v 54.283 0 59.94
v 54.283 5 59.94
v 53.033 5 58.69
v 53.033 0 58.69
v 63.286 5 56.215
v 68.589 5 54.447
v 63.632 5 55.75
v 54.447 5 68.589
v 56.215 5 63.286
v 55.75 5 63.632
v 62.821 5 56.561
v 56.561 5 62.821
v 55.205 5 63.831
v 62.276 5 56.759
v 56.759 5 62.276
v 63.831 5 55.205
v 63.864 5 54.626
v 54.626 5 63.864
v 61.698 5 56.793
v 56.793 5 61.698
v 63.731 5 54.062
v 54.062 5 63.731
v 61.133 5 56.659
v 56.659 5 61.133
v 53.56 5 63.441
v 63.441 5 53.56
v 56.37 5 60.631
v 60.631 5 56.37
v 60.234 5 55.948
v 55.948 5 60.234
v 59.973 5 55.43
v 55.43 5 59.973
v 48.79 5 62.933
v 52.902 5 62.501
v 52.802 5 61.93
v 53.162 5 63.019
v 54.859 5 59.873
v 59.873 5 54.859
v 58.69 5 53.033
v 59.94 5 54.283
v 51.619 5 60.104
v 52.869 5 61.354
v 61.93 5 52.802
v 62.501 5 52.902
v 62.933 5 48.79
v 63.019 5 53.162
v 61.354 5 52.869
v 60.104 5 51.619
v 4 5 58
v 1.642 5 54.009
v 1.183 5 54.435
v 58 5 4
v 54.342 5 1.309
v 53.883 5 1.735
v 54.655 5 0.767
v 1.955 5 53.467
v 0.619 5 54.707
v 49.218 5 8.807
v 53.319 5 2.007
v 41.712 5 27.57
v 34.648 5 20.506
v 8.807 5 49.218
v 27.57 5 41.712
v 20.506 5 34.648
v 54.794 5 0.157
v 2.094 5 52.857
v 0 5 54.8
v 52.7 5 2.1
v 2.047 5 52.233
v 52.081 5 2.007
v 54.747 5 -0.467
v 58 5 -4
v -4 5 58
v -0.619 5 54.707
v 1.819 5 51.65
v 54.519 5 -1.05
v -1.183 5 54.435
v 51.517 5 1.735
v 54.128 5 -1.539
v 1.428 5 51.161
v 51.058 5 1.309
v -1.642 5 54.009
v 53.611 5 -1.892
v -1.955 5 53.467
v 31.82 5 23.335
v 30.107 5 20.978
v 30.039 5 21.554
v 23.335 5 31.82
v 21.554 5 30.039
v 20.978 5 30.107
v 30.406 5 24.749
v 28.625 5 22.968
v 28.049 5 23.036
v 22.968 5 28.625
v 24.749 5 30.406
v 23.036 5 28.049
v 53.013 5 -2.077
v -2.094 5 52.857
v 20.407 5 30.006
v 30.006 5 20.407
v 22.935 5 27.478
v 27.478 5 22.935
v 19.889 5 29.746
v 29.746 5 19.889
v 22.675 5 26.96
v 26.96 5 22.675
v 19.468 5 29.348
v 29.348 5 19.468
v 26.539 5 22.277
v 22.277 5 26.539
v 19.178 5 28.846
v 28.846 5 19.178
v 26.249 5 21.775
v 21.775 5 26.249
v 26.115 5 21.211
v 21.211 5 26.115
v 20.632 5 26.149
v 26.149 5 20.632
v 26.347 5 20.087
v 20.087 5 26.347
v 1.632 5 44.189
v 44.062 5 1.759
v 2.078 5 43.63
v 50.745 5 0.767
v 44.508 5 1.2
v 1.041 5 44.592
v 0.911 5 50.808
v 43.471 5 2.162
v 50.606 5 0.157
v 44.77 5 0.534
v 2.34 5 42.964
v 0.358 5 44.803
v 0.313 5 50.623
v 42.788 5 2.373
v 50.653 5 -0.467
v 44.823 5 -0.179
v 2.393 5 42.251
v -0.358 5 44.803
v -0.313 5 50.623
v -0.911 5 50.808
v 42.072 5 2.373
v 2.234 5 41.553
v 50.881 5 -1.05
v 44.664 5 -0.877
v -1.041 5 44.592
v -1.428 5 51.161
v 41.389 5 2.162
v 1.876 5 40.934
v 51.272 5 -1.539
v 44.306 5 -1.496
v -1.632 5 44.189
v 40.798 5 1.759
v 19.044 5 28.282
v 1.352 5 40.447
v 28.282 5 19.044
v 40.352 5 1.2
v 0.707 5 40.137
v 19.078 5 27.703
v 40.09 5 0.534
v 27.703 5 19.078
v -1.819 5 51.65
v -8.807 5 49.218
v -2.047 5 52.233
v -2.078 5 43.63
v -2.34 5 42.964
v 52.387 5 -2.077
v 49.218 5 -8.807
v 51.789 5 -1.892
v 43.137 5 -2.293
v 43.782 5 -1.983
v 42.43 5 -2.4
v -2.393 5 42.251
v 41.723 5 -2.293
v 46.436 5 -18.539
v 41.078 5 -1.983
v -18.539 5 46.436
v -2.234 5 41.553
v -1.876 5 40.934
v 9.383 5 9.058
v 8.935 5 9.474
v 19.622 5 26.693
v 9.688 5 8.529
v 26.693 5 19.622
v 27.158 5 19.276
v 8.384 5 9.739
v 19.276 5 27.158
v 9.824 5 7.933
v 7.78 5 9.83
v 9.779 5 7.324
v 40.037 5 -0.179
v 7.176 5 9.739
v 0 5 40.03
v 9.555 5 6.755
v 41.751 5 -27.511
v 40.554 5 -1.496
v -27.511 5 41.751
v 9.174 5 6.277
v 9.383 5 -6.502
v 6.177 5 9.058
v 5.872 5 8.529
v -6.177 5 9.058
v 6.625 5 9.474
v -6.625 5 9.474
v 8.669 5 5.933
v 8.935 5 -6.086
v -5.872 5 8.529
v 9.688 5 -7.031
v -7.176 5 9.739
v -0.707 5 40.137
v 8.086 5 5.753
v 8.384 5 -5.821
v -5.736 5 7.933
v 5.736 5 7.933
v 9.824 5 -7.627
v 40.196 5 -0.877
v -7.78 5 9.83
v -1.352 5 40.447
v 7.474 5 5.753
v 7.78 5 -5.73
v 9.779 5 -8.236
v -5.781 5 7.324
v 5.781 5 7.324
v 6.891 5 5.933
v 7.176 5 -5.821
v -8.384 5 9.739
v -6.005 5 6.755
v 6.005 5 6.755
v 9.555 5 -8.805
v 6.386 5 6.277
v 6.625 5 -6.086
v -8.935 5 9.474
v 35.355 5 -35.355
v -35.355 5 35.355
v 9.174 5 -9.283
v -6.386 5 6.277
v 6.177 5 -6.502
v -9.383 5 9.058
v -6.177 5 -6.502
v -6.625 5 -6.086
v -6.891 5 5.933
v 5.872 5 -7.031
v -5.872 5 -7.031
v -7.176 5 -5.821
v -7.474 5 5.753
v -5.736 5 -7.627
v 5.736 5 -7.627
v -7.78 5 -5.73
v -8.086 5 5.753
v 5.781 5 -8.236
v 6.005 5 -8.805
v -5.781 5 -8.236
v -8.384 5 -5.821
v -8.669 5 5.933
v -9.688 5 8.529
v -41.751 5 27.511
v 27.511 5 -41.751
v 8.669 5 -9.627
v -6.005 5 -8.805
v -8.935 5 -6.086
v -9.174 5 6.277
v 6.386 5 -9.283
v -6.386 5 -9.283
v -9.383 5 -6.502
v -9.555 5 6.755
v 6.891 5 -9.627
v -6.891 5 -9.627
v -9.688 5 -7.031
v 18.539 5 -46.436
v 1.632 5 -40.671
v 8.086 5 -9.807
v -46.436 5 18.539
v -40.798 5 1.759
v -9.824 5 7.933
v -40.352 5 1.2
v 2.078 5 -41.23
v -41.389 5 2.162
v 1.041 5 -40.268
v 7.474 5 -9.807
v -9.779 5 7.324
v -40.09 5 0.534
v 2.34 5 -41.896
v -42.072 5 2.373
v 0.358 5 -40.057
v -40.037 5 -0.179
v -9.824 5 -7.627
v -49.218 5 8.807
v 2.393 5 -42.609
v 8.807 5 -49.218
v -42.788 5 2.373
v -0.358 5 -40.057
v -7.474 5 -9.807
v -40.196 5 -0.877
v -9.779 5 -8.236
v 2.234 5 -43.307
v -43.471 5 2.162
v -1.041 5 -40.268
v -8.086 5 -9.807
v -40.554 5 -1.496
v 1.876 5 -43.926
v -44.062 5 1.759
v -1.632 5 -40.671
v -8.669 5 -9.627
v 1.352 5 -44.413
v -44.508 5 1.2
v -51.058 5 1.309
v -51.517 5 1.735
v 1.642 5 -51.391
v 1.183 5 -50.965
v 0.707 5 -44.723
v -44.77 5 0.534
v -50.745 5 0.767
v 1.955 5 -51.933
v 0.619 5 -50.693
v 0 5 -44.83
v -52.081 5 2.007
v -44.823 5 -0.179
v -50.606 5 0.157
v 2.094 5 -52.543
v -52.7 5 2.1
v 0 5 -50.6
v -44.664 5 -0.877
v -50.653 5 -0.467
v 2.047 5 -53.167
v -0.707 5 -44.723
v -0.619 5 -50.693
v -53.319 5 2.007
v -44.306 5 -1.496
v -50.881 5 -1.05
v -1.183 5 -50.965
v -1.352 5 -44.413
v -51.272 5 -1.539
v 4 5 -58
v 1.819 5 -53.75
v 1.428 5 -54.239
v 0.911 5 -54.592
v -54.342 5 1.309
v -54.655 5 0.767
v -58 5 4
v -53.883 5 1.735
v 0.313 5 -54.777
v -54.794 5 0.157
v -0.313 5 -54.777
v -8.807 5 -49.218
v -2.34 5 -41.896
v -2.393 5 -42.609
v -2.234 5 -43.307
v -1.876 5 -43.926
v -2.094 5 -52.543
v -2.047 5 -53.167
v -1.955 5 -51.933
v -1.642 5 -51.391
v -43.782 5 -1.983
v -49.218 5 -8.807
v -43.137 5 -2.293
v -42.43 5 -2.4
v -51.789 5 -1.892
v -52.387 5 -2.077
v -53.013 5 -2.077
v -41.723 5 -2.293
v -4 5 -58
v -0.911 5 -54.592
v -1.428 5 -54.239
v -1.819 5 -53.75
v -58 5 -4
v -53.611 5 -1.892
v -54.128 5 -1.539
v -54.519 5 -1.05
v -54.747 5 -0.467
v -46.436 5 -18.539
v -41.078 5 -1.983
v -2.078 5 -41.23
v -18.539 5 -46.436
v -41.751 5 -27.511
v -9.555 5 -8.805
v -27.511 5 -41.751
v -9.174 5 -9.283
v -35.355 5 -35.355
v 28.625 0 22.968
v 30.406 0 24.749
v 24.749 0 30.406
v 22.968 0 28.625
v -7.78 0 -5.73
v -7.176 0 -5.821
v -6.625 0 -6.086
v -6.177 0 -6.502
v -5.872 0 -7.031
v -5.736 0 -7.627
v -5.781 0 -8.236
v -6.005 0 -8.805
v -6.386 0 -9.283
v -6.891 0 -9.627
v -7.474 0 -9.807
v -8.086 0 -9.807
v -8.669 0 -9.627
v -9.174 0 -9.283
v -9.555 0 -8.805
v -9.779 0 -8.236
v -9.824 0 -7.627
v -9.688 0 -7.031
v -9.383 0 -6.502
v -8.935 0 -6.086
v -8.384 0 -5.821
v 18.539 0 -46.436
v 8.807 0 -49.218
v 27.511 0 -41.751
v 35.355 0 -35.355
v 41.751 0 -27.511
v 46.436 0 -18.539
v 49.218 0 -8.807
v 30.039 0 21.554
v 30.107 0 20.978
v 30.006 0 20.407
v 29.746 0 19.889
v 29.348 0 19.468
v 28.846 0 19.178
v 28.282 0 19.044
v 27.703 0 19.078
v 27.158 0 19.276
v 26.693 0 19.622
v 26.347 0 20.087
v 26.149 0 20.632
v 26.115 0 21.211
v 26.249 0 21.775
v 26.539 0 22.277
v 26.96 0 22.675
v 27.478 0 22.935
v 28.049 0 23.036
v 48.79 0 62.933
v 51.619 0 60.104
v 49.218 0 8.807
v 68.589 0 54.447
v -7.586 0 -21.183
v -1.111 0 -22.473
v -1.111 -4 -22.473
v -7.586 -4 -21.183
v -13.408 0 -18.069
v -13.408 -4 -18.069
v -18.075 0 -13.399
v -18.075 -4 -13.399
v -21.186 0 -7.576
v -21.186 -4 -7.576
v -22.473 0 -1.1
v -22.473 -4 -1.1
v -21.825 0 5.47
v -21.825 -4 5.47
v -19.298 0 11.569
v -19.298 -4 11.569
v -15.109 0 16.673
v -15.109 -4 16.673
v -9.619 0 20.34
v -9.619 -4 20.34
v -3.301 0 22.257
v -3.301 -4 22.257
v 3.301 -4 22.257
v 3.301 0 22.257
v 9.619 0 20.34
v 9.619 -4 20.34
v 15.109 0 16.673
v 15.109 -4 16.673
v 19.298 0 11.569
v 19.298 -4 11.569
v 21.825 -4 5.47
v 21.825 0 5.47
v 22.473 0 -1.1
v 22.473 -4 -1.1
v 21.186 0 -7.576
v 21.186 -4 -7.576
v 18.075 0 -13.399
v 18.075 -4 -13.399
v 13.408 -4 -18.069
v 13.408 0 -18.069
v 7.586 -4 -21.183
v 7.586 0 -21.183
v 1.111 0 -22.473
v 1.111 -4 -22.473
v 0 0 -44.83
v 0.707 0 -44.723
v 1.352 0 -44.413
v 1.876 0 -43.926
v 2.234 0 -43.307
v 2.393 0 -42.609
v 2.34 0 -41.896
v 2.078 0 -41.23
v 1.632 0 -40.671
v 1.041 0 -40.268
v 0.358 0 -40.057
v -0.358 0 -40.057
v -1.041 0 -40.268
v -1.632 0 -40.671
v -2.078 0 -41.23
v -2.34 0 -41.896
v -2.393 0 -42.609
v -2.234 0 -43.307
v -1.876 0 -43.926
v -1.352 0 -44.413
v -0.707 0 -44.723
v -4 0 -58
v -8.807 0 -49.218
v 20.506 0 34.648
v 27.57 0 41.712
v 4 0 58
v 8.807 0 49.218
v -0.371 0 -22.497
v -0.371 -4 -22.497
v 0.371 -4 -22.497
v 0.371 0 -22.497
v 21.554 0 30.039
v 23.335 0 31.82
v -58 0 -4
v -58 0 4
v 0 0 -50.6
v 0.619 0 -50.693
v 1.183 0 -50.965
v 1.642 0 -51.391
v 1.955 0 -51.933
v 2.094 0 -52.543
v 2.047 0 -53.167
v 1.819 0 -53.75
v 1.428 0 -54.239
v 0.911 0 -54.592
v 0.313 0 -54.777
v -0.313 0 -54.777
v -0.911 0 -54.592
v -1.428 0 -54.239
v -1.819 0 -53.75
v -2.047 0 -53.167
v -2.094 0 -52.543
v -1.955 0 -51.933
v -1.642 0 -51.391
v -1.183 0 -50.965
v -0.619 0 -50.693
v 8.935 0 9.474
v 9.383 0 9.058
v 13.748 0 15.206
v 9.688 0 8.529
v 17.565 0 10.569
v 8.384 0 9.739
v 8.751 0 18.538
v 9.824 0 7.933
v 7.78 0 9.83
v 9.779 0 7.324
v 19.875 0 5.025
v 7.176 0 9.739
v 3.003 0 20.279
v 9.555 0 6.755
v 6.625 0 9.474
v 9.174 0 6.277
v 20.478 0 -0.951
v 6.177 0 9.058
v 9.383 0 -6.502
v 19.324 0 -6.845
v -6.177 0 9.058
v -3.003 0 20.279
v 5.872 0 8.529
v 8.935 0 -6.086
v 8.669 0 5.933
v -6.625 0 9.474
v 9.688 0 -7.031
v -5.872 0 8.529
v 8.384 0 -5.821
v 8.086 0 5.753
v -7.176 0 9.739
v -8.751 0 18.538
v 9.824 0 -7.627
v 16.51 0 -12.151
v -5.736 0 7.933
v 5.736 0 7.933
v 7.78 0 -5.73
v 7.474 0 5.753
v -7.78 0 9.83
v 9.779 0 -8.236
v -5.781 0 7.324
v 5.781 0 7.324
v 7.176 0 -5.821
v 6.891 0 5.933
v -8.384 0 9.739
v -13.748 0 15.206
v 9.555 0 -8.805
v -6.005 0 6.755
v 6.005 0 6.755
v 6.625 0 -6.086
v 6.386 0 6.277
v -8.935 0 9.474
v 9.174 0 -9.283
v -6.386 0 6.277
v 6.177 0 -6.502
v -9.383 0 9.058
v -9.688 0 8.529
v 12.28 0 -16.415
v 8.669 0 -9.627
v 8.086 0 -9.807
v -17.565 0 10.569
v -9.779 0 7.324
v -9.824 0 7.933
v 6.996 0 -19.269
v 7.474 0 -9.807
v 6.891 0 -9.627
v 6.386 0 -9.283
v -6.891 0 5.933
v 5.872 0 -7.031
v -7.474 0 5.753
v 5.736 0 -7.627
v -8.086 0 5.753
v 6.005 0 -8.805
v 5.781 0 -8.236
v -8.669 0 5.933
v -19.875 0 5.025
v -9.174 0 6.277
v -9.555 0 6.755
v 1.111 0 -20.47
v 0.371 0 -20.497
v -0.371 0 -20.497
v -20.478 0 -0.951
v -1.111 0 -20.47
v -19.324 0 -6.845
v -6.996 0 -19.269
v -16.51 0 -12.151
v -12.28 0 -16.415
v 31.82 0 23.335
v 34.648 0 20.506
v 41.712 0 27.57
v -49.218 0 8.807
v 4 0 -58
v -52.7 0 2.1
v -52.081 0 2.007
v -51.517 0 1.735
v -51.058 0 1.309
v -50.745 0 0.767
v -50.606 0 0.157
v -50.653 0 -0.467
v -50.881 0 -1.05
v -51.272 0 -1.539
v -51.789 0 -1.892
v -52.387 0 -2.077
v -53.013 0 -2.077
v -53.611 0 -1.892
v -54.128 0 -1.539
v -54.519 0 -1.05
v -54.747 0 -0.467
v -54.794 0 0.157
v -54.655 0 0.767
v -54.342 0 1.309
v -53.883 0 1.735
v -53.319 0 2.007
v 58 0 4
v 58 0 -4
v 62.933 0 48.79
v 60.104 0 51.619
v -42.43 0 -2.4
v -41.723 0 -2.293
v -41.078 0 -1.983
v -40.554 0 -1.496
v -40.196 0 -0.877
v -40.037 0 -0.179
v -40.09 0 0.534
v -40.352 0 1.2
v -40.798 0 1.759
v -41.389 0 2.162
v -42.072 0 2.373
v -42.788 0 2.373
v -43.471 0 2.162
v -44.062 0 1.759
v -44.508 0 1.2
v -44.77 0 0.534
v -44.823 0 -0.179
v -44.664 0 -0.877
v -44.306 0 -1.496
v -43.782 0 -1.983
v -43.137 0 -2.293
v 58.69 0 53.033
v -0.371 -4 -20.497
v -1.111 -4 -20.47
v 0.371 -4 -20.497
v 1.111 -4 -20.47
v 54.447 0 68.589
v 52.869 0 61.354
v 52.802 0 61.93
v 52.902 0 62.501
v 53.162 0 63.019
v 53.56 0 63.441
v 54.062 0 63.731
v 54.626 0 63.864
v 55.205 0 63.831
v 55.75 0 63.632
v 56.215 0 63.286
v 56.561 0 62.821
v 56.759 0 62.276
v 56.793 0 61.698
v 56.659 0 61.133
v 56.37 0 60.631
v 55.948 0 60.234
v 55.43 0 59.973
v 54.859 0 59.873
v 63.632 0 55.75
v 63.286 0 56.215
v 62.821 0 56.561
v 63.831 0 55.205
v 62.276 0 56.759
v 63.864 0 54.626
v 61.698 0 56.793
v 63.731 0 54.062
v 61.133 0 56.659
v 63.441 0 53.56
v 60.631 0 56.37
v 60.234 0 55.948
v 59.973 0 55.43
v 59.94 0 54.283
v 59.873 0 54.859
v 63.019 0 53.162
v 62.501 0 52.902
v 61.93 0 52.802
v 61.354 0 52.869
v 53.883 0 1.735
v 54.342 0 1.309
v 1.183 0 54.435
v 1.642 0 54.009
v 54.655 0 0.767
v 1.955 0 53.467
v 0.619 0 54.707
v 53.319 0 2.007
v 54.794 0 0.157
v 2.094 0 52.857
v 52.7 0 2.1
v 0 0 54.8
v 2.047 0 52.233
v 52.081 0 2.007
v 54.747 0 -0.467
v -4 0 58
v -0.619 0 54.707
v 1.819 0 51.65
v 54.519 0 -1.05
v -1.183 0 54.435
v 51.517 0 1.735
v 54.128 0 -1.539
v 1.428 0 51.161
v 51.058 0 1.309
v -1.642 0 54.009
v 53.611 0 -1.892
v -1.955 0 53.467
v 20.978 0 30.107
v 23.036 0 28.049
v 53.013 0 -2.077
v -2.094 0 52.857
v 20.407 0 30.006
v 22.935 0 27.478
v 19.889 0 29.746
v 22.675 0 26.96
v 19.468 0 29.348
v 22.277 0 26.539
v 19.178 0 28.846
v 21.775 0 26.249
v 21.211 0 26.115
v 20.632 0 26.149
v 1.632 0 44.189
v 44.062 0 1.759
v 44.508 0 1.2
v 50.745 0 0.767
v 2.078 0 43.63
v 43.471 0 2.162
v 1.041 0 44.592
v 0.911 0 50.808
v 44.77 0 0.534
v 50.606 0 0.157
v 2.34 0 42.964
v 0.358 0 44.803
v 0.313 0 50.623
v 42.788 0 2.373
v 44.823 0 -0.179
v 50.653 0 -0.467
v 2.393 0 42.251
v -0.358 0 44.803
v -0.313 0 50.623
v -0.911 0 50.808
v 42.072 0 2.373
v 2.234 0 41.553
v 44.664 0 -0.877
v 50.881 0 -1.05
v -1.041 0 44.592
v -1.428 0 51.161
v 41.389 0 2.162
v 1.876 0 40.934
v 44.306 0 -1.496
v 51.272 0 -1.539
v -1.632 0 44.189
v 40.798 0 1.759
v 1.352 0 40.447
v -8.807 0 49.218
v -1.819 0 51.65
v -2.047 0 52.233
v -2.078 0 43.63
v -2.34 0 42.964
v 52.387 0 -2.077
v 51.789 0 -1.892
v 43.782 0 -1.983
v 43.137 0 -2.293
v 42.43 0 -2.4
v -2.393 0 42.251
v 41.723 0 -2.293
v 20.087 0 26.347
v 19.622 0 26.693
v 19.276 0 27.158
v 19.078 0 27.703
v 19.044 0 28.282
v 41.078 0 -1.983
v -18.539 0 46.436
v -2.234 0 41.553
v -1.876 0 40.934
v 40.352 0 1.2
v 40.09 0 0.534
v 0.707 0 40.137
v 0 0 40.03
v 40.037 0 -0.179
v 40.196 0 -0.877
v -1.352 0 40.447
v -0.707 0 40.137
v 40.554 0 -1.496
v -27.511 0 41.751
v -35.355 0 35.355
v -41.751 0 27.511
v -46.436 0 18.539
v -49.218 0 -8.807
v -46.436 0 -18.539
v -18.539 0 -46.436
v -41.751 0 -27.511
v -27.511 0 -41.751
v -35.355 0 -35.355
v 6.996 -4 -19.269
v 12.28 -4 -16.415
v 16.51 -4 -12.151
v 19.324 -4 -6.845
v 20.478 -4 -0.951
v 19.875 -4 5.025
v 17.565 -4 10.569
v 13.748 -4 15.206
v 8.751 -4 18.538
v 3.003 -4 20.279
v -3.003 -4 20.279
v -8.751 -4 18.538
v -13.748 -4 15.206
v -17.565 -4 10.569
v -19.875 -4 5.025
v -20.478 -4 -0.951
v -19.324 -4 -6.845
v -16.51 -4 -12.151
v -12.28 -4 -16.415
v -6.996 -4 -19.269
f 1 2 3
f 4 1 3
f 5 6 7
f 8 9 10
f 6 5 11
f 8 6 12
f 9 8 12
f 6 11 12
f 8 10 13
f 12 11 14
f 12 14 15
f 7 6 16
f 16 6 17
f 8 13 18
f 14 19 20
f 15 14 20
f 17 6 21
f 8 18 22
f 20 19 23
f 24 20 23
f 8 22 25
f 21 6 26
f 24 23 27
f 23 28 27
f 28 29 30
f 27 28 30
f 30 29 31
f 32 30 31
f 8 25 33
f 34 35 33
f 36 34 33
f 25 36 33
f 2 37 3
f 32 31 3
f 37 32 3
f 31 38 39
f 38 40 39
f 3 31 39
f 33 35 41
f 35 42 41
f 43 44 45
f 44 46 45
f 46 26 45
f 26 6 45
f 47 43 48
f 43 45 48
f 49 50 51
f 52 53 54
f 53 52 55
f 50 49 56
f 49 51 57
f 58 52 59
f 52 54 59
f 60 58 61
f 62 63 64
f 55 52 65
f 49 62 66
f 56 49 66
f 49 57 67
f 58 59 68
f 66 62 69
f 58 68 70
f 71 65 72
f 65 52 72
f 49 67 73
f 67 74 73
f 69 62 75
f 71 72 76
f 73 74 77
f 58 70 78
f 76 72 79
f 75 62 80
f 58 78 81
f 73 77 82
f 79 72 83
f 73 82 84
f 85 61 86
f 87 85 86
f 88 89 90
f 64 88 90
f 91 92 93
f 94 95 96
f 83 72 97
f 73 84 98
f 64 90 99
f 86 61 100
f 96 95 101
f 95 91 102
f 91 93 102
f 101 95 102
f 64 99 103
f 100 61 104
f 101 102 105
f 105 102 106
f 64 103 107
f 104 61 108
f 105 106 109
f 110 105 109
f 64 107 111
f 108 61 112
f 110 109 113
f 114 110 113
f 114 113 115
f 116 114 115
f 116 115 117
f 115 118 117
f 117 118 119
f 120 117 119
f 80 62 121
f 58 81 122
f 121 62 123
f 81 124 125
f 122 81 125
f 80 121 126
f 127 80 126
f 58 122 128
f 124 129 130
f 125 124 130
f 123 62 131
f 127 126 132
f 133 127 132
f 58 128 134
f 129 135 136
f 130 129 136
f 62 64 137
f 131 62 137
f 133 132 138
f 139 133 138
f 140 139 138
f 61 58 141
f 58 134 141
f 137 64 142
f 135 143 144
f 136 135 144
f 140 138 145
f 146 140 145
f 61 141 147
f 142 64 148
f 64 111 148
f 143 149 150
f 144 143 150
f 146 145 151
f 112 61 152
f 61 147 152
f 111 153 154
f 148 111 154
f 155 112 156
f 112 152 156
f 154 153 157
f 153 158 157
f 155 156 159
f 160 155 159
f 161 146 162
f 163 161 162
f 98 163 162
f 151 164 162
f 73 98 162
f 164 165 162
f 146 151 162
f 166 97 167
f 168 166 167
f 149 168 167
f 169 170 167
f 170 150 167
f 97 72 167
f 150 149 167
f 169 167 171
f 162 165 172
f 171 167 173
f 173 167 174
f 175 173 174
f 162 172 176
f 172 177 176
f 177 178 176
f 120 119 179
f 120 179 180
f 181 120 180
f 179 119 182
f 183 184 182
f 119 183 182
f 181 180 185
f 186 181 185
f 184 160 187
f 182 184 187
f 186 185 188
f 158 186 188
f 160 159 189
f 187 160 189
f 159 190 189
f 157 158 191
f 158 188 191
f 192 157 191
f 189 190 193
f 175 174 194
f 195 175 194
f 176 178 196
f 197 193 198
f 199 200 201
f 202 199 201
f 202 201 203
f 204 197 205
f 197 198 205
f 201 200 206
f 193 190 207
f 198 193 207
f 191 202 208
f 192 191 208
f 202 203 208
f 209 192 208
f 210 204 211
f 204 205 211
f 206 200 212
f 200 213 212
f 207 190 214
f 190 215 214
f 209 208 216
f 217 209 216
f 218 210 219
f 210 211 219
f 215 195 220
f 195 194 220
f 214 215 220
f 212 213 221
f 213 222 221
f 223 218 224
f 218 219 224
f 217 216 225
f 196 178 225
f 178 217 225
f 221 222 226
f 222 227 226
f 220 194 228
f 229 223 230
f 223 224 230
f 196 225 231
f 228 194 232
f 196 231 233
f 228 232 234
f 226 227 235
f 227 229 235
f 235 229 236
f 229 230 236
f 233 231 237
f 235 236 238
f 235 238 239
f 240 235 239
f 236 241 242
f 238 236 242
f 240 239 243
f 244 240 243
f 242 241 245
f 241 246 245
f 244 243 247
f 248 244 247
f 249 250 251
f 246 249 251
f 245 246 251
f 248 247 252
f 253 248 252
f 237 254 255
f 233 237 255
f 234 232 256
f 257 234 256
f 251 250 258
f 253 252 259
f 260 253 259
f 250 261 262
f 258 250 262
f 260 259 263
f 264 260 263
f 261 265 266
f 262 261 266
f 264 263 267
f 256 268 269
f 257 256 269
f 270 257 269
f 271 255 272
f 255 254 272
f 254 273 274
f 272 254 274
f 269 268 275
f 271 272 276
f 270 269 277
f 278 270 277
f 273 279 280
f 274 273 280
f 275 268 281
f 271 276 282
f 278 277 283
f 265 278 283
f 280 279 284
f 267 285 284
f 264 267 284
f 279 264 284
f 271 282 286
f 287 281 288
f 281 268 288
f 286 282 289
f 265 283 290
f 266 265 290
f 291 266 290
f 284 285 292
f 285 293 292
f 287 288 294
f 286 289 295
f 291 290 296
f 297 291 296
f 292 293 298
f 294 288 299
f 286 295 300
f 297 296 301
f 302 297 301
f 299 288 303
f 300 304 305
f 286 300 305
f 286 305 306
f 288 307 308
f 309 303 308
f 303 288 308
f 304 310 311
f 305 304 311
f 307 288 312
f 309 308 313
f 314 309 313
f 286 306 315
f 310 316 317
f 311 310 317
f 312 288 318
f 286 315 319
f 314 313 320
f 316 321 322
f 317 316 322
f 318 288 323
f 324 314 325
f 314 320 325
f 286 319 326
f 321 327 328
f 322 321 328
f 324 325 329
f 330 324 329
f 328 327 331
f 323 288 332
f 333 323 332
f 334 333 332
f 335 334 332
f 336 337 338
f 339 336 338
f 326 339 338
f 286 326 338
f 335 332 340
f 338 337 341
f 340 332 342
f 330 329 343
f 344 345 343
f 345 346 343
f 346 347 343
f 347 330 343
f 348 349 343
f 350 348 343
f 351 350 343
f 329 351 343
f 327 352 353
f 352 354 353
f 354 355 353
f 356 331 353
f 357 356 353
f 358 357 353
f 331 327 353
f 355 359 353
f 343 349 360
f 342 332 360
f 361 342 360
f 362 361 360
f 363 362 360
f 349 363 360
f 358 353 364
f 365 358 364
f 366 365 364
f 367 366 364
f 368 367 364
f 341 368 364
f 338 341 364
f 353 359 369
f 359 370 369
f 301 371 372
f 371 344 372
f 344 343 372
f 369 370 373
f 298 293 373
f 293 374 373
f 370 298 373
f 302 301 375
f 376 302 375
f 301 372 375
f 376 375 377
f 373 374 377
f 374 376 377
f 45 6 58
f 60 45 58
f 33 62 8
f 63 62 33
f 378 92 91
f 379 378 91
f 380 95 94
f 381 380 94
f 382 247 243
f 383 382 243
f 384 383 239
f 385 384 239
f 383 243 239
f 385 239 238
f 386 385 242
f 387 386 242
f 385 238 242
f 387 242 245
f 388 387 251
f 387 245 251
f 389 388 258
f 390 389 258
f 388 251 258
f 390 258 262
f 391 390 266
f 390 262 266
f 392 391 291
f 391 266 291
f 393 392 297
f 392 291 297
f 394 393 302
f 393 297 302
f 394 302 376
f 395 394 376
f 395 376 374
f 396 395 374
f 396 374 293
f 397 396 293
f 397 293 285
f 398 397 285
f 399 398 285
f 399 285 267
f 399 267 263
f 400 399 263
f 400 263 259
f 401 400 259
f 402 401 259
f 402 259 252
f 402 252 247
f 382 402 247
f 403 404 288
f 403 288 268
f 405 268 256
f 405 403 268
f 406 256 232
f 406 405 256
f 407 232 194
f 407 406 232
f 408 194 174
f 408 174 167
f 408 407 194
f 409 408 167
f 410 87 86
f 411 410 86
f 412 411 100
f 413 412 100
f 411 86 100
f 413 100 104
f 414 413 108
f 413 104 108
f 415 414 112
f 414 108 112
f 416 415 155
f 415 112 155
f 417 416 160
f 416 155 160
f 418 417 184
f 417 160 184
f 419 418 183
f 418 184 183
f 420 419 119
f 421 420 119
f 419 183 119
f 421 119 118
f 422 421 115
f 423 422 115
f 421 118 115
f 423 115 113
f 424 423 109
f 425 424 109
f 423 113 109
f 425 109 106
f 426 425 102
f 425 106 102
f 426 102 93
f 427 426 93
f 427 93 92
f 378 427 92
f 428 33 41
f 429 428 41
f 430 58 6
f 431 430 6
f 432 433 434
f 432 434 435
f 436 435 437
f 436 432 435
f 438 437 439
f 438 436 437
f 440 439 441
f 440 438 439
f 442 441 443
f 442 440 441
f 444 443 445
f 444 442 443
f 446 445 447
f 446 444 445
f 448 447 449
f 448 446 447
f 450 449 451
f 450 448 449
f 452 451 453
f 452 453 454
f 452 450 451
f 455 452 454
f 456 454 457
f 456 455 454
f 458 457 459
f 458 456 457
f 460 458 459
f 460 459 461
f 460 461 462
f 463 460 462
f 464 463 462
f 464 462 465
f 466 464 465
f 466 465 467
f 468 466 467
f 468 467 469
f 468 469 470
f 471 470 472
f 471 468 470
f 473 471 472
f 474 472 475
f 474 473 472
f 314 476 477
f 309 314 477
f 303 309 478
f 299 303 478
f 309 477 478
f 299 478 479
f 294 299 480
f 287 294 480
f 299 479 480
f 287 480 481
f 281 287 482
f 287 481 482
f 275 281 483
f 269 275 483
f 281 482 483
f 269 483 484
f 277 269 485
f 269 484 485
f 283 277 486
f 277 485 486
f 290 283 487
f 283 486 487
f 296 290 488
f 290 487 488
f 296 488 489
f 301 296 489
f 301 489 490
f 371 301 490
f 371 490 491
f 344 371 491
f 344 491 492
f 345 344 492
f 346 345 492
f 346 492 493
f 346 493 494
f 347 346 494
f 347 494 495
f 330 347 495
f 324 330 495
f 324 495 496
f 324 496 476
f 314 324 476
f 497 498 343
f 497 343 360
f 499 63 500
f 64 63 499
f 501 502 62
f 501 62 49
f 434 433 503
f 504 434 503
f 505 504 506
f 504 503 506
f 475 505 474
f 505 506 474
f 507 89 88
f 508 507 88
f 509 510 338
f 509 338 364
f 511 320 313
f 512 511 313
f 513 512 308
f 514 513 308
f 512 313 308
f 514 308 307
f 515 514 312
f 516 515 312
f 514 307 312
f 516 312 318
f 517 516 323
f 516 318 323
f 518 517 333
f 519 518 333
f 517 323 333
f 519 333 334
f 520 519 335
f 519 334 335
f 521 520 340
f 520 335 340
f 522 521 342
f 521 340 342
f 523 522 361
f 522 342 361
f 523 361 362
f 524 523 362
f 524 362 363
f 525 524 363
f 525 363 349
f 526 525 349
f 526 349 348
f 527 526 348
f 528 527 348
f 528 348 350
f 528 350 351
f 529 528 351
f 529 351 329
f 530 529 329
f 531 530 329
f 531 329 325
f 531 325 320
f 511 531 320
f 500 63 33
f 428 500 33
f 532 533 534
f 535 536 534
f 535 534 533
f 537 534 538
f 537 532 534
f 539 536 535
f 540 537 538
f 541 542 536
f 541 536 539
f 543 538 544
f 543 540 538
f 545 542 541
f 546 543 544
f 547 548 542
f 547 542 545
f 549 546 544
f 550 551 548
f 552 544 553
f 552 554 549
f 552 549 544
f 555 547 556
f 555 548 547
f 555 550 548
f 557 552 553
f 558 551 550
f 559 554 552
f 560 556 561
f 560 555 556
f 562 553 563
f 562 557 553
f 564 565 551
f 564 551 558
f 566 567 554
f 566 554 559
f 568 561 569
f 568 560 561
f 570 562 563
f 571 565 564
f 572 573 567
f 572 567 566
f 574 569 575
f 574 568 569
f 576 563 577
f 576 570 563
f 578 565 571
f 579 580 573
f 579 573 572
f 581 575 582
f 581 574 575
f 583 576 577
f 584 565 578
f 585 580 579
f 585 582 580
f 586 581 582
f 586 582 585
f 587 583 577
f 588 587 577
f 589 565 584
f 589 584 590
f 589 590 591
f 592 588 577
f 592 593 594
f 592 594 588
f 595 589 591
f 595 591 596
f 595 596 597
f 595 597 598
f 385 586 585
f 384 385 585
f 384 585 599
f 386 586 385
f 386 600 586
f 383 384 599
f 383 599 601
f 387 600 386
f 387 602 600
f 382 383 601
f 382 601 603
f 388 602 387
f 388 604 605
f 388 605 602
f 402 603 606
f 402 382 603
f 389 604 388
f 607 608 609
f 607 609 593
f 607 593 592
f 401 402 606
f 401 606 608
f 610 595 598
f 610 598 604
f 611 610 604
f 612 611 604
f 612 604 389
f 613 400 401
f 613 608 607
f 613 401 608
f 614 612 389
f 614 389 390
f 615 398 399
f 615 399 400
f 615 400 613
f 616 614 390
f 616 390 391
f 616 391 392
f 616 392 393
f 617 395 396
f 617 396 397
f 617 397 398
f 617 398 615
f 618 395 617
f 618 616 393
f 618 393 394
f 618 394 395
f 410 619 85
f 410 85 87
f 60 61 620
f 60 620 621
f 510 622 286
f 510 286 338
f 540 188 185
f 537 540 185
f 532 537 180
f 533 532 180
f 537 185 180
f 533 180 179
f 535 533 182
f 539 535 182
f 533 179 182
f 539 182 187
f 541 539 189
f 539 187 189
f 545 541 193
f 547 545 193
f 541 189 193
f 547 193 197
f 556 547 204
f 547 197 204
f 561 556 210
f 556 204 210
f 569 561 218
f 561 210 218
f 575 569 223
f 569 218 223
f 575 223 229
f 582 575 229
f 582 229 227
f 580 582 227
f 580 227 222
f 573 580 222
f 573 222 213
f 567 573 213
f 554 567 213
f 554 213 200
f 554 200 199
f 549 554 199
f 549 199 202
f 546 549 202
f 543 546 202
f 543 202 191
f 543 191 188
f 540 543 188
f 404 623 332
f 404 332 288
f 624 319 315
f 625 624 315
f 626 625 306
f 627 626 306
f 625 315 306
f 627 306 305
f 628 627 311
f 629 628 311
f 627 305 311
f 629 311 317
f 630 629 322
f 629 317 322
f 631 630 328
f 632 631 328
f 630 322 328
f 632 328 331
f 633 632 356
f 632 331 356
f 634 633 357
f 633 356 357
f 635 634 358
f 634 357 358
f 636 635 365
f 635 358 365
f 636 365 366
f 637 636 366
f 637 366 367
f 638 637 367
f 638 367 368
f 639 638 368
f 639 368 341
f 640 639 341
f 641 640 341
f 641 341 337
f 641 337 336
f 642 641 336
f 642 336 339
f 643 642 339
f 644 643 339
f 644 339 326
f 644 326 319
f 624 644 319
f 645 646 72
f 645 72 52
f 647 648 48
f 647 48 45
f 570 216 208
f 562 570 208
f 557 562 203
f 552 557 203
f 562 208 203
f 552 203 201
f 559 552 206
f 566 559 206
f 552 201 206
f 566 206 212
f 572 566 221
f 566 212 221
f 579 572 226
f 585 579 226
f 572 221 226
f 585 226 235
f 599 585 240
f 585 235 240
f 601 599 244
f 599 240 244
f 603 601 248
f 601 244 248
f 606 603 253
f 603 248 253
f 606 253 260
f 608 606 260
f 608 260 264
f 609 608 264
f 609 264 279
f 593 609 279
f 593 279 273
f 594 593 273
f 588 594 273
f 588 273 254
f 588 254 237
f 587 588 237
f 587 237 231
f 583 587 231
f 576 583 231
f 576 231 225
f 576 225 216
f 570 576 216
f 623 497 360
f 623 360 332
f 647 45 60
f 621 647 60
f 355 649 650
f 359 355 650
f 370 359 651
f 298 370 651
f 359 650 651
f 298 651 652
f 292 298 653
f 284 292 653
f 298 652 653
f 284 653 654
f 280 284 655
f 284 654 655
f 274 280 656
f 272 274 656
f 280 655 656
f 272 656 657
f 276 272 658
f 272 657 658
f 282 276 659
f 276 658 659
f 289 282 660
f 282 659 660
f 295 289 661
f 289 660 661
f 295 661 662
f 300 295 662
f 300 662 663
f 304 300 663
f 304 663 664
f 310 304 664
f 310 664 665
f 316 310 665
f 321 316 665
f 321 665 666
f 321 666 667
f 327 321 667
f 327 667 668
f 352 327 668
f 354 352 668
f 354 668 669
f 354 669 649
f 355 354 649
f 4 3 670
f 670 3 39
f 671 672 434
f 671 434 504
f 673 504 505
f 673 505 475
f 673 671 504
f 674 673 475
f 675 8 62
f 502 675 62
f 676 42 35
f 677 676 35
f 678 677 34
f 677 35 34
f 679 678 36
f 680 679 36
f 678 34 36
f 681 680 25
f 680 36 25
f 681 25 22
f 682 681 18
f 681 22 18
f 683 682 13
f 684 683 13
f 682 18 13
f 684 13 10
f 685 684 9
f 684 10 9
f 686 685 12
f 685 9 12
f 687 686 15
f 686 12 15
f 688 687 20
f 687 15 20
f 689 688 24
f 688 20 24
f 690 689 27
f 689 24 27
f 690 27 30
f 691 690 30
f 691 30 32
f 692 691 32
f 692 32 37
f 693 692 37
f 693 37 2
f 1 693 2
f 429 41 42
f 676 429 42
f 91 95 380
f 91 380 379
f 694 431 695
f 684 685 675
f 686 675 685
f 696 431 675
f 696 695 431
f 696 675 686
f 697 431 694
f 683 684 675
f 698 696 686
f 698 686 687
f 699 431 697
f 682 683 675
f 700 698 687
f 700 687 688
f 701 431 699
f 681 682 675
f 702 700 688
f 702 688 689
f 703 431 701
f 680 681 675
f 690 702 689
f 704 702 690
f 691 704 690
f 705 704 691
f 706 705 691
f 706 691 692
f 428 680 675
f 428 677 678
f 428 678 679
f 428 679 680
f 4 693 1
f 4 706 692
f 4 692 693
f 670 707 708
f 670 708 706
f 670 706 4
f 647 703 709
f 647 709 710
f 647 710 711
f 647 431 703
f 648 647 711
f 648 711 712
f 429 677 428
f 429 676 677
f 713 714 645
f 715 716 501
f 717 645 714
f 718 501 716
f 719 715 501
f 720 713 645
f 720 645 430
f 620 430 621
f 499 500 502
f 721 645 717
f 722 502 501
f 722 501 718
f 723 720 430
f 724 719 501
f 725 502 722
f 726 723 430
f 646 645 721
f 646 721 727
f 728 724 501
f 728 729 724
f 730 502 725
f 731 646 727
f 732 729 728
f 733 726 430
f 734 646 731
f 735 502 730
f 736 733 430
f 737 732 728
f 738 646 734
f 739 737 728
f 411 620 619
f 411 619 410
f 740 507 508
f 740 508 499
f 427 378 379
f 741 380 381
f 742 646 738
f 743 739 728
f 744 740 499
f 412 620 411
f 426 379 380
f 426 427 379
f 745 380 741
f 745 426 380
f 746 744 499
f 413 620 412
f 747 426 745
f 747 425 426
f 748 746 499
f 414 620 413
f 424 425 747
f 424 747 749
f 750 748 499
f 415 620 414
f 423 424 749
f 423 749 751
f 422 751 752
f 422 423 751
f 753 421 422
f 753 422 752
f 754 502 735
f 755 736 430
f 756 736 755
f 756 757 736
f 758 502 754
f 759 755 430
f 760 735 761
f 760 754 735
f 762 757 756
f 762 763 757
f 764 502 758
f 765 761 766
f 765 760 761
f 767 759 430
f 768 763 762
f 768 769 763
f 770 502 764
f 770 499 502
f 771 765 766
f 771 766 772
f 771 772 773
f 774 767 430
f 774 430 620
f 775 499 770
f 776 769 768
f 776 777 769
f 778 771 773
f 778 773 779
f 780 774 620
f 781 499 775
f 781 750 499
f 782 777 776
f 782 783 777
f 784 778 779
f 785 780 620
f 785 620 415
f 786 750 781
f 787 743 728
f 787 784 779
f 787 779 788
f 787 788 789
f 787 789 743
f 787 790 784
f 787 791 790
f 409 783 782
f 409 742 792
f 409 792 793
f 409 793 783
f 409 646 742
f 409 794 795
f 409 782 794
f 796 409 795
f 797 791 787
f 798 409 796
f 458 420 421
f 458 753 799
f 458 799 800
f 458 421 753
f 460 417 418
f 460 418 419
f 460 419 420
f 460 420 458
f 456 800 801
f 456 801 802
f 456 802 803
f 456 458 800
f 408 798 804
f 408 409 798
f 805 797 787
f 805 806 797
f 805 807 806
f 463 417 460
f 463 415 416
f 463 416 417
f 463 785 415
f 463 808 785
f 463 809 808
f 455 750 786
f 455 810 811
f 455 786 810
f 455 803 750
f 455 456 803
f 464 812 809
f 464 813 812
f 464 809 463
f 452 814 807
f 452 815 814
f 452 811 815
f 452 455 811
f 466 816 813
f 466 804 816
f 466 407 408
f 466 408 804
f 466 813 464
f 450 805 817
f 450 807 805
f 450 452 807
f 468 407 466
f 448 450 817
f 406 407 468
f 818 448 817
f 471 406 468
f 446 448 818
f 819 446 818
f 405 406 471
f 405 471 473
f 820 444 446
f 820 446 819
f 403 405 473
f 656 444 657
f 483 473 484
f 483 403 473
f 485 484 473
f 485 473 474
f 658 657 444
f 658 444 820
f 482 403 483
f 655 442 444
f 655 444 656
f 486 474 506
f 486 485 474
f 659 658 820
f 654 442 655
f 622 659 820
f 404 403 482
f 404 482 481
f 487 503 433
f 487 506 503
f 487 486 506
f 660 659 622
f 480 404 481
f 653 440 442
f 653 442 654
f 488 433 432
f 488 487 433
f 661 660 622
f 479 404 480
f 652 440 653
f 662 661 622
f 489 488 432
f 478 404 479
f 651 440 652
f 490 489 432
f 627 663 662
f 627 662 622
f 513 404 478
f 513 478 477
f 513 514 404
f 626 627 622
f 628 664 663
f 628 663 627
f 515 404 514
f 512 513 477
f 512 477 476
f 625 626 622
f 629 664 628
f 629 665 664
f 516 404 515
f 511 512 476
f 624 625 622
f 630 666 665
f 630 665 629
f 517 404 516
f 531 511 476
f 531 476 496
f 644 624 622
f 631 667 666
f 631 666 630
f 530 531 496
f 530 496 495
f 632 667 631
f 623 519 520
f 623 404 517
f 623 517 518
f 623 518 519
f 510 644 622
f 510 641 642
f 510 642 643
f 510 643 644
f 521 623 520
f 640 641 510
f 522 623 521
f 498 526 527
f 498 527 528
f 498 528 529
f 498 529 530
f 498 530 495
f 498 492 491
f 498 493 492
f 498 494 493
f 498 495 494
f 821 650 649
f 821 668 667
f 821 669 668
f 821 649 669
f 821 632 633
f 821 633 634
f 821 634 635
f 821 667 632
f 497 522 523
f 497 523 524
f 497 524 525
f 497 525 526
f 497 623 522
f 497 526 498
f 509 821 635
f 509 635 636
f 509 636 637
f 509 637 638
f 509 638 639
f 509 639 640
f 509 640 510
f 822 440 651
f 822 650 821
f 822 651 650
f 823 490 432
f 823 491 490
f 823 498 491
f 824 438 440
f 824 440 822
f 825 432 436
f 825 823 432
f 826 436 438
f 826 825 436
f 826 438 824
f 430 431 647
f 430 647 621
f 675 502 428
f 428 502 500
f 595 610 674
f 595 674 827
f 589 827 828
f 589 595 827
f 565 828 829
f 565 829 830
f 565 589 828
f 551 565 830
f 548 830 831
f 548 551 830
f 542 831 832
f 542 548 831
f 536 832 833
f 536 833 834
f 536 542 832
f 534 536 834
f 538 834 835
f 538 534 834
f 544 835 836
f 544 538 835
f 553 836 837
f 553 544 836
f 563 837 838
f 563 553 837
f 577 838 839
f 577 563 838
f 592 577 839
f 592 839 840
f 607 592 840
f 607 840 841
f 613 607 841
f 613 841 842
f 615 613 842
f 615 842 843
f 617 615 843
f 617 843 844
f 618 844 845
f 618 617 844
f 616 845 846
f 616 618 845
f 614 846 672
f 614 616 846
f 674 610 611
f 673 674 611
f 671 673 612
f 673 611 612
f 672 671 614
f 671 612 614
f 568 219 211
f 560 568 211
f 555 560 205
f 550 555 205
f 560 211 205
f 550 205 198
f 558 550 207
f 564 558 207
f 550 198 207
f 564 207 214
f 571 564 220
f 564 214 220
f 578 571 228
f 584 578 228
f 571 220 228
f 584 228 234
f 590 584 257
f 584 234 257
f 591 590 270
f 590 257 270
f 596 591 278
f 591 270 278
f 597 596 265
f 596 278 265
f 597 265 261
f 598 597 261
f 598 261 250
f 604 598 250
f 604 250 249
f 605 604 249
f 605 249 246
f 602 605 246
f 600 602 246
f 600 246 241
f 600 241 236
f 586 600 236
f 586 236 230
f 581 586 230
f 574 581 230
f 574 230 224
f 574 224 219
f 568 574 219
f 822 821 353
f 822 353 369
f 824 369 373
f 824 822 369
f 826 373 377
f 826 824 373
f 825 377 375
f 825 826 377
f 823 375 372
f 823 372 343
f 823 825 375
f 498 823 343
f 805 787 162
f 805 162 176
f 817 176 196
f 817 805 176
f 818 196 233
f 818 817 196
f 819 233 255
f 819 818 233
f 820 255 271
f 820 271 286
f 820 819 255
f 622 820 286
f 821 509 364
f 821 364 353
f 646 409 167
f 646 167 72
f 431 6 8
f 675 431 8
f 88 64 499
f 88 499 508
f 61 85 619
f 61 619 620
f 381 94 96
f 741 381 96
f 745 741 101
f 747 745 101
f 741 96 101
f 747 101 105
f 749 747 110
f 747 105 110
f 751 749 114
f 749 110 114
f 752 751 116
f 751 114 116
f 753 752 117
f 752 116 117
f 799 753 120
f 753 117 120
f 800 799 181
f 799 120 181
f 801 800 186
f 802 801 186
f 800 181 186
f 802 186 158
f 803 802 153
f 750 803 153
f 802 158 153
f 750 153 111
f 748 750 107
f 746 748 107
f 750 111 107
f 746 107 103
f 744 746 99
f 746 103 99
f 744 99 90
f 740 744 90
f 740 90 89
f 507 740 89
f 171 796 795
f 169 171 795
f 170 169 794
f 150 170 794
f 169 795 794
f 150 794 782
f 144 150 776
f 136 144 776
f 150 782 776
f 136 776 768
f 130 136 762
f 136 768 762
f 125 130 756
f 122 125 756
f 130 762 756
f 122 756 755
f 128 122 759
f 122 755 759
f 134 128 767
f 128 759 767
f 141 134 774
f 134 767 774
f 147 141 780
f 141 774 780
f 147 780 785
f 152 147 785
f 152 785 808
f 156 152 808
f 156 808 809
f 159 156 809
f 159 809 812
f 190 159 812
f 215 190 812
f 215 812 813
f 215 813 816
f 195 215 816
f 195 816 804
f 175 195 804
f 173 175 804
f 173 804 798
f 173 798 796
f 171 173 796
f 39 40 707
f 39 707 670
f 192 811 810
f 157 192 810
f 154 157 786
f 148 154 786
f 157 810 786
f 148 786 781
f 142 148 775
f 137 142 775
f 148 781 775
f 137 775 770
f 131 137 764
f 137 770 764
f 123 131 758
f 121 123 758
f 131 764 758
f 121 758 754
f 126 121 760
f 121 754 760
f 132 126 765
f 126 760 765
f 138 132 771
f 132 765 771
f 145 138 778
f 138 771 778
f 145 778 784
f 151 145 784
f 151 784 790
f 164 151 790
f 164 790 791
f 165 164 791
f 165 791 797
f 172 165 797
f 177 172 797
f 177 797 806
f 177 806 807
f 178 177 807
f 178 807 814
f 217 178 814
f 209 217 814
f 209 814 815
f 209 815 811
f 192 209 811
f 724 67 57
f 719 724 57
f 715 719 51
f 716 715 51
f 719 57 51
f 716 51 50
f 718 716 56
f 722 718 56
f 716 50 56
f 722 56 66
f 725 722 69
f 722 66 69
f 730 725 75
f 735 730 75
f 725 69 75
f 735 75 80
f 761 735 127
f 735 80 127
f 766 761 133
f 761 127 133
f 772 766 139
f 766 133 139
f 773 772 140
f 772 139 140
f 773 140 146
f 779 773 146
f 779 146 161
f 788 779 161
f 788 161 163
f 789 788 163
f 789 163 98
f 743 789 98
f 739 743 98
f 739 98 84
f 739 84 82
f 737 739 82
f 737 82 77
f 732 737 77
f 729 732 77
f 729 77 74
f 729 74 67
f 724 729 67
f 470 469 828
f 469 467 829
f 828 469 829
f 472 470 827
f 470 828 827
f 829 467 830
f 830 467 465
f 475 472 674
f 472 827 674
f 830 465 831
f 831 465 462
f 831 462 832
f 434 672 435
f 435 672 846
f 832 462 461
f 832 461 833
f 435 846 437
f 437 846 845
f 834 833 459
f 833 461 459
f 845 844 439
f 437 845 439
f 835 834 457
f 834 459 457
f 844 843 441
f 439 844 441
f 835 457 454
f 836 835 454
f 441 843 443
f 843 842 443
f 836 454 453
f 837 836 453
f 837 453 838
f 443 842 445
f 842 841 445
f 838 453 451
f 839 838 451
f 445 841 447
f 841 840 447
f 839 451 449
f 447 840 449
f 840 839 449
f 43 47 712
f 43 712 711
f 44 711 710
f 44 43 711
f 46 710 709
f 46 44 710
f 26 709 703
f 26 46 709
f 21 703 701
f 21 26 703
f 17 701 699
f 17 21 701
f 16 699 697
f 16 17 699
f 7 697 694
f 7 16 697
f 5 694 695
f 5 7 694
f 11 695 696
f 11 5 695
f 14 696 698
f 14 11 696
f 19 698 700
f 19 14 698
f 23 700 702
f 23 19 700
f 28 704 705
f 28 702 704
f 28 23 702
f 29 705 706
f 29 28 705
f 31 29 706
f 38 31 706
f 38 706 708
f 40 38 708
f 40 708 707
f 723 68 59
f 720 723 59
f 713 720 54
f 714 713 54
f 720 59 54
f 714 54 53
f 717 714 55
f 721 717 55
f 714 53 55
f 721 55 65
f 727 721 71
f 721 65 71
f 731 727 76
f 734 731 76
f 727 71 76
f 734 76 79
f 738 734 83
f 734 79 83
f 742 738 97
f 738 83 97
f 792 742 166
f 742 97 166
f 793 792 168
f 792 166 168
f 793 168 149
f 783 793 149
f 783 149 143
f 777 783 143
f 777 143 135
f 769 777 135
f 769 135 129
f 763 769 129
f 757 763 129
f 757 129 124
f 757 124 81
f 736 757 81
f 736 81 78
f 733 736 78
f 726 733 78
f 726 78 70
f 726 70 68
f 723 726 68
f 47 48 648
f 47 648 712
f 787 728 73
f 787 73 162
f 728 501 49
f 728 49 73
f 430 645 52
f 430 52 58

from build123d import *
from build123d.topology import SkipClean

# Parameters (mm, degrees)
SALIENTE_EXTRUIR1_DEPTH = 5
CROQUIS2_R              = 2.1
CORTAR_EXTRUIR1_DEPTH   = 83.176639016
CORTAR_EXTRUIR2_DEPTH   = 83.176639016
CROQUIS5_R              = 2.05
CORTAR_EXTRUIR4_DEPTH   = 83.176639016
SALIENTE_EXTRUIR2_DEPTH = 5
CORTAR_EXTRUIR10_DEPTH  = 98.128780493
SALIENTE_EXTRUIR4_DEPTH = 4
SALIENTE_EXTRUIR5_DEPTH = 4
CROQUIS17_R             = 2.4
CORTAR_EXTRUIR11_DEPTH  = 98.128780493


with BuildPart() as part:
    # Croquis1 → Saliente-Extruir1 (new body)
    with BuildSketch(Plane(origin=(0, 0, 0), x_dir=(1, 0, 0), z_dir=(0, 1, 0))):
        with BuildLine():
            Line((4, 58), (8.807070745, 49.218243619))
            ThreePointArc((8.807070745, 49.218243619), (35.355339059, 35.355339059), (49.218243619, 8.807070745))
            Line((49.218243619, 8.807070745), (58, 4))
            Line((58, 4), (58, -4))
            Line((58, -4), (49.218243619, -8.807070745))
            ThreePointArc((49.218243619, -8.807070745), (35.355339059, -35.355339059), (8.807070745, -49.218243619))
            Line((8.807070745, -49.218243619), (4, -58))
            Line((4, -58), (-4, -58))
            Line((-4, -58), (-8.807070745, -49.218243619))
            ThreePointArc((-8.807070745, -49.218243619), (-35.355339059, -35.355339059), (-49.218243619, -8.807070745))
            Line((-49.218243619, -8.807070745), (-58, -4))
            Line((-58, -4), (-58, 4))
            Line((-58, 4), (-49.218243619, 8.807070745))
            ThreePointArc((-49.218243619, 8.807070745), (-35.355339059, 35.355339059), (-8.807070745, 49.218243619))
            Line((-8.807070745, 49.218243619), (-4, 58))
            Line((-4, 58), (4, 58))
        make_face()
    extrude(amount=SALIENTE_EXTRUIR1_DEPTH)

    # Croquis2 → Cortar-Extruir1 (cut, through all)
    with BuildSketch(Plane(origin=(0, 5, 0), x_dir=(1, 0, 0), z_dir=(0, 1, 0))):
        with Locations(Location((0, 52.7, 0), (0, 0, 270))):
            Circle(CROQUIS2_R)
        with Locations(Location((52.7, 0, 0), (0, 0, 270))):
            Circle(CROQUIS2_R)
        with Locations(Location((0, -52.7, 0), (0, 0, 270))):
            Circle(CROQUIS2_R)
        with Locations(Location((-52.7, 0, 0), (0, 0, 270))):
            Circle(CROQUIS2_R)
    extrude(amount=-CORTAR_EXTRUIR1_DEPTH, mode=Mode.SUBTRACT)

    # Croquis3 → Cortar-Extruir2 (cut, through all)
    with BuildSketch(Plane(origin=(0, 5, 0), x_dir=(1, 0, 0), z_dir=(0, 1, 0))):
        Polygon((20.506096654, -34.648232278), (34.648232278, -20.506096654), (47.376154339, -33.234018716), (67.218949341, -53.076813717), (53.076813717, -67.218949341), (33.234018716, -47.376154339), align=None)
    extrude(amount=-CORTAR_EXTRUIR2_DEPTH, mode=Mode.SUBTRACT)

    # Croquis5 → Cortar-Extruir4 (cut, through all)
    with BuildSketch(Plane(origin=(0, 5, 0), x_dir=(1, 0, 0), z_dir=(0, 1, 0))):
        with Locations(Location((-7.78, 7.78, 0), (0, 0, 270))):
            Circle(CROQUIS5_R)
        with Locations(Location((7.78, 7.78, 0), (0, 0, 270))):
            Circle(CROQUIS5_R)
        with Locations(Location((7.78, -7.78, 0), (0, 0, 270))):
            Circle(CROQUIS5_R)
        with Locations(Location((-7.78, -7.78, 0), (0, 0, 270))):
            Circle(CROQUIS5_R)
        with BuildLine():
            Line((21.554064831, -30.039346205), (23.334523779, -31.819805153))
            Line((23.334523779, -31.819805153), (24.748737342, -30.405591591))
            Line((24.748737342, -30.405591591), (22.968278393, -28.625132642))
            ThreePointArc((22.968278393, -28.625132642), (19.622213178, -26.69328099), (21.554064831, -30.039346205))
        make_face()
        with BuildLine():
            Line((28.625132642, -22.968278393), (30.986174209, -25.329319959))
            Line((30.986174209, -25.329319959), (32.400387771, -23.915106397))
            Line((32.400387771, -23.915106397), (30.039346205, -21.554064831))
            ThreePointArc((30.039346205, -21.554064831), (26.69328099, -19.622213178), (28.625132642, -22.968278393))
        make_face()
    extrude(amount=-CORTAR_EXTRUIR4_DEPTH, mode=Mode.SUBTRACT)

    # Croquis7 → Saliente-Extruir2 (add, through all)
    with BuildSketch(Plane(origin=(0, 5, 0), x_dir=(1, 0, 0), z_dir=(0, 1, 0))):
        Polygon((68.589357775, -54.447222151), (54.447222151, -68.589357775), (8.807070745, -49.218243619), (18.571685103, -46.422973972), (27.56994834, -41.712083963), (48.790367902, -62.932503526), (62.932503526, -48.790367902), (41.712083963, -27.56994834), (46.422973972, -18.571685103), (49.218243619, -8.807070745), align=None)
    extrude(amount=-SALIENTE_EXTRUIR2_DEPTH)

    # Croquis8 → Cortar-Extruir10 (cut, through all)
    with BuildSketch(Plane(origin=(0, 5, 0), x_dir=(1, 0, 0), z_dir=(0, 1, 0))):
        with BuildLine():
            Line((54.283137452, -59.939991701), (51.490214314, -57.147068564))
            Line((51.490214314, -57.147068564), (50.076000752, -58.561282126))
            Line((50.076000752, -58.561282126), (52.868923889, -61.354205264))
            ThreePointArc((52.868923889, -61.354205264), (56.214989104, -63.286056916), (54.283137452, -59.939991701))
        make_face()
        with BuildLine():
            Line((57.371843354, -51.714989104), (58.786056916, -50.300775542))
            Line((58.786056916, -50.300775542), (61.354205264, -52.868923889))
            ThreePointArc((61.354205264, -52.868923889), (63.286056916, -56.214989104), (59.939991701, -54.283137452))
            Line((59.939991701, -54.283137452), (57.371843354, -51.714989104))
        make_face()
    extrude(amount=-CORTAR_EXTRUIR10_DEPTH, mode=Mode.SUBTRACT)

    # Croquis15 → Saliente-Extruir4 (add)
    with BuildSketch(Plane.XZ):
        with BuildLine():
            Line((-1.111111111, -20.469866441), (-1.111111111, -22.472548411))
            ThreePointArc((-1.111111111, -22.472548411), (0, 22.5), (1.111111111, -22.472548411))
            Line((1.111111111, -22.472548411), (1.111111111, -20.469866441))
            ThreePointArc((1.111111111, -20.469866441), (0, 20.5), (-1.111111111, -20.469866441))
        make_face()
    extrude(amount=SALIENTE_EXTRUIR4_DEPTH)

    # Croquis16 → Saliente-Extruir5 (add)
    with SkipClean():  # the faces are left unmerged after this step: merging them gives an invalid solid
        with BuildSketch(Plane.XZ):
            with BuildLine():
                Line((-1.111111111, -20.469866441), (-1.111111111, -22.472548411))
                ThreePointArc((-1.111111111, -22.472548411), (0, -22.5), (1.111111111, -22.472548411))
                Line((1.111111111, -22.472548411), (1.111111111, -20.469866441))
                ThreePointArc((1.111111111, -20.469866441), (0, -20.5), (-1.111111111, -20.469866441))
            make_face()
        extrude(amount=SALIENTE_EXTRUIR5_DEPTH)

    # Croquis17 → Cortar-Extruir11 (cut, through all)
    with SkipClean():  # the faces are left unmerged after this step: merging them gives an invalid solid
        with BuildSketch(Plane.XZ):
            with Locations(Location((42.43, 0, 0), (0, 0, 270))):
                Circle(CROQUIS17_R)
            with Locations(Location((0, -42.43, 0), (0, 0, 270))):
                Circle(CROQUIS17_R)
            with Locations(Location((-42.43, 0, 0), (0, 0, 270))):
                Circle(CROQUIS17_R)
            with Locations(Location((0, 42.43, 0), (0, 0, 270))):
                Circle(CROQUIS17_R)
        extrude(amount=-CORTAR_EXTRUIR11_DEPTH, mode=Mode.SUBTRACT)


solid = part.part
